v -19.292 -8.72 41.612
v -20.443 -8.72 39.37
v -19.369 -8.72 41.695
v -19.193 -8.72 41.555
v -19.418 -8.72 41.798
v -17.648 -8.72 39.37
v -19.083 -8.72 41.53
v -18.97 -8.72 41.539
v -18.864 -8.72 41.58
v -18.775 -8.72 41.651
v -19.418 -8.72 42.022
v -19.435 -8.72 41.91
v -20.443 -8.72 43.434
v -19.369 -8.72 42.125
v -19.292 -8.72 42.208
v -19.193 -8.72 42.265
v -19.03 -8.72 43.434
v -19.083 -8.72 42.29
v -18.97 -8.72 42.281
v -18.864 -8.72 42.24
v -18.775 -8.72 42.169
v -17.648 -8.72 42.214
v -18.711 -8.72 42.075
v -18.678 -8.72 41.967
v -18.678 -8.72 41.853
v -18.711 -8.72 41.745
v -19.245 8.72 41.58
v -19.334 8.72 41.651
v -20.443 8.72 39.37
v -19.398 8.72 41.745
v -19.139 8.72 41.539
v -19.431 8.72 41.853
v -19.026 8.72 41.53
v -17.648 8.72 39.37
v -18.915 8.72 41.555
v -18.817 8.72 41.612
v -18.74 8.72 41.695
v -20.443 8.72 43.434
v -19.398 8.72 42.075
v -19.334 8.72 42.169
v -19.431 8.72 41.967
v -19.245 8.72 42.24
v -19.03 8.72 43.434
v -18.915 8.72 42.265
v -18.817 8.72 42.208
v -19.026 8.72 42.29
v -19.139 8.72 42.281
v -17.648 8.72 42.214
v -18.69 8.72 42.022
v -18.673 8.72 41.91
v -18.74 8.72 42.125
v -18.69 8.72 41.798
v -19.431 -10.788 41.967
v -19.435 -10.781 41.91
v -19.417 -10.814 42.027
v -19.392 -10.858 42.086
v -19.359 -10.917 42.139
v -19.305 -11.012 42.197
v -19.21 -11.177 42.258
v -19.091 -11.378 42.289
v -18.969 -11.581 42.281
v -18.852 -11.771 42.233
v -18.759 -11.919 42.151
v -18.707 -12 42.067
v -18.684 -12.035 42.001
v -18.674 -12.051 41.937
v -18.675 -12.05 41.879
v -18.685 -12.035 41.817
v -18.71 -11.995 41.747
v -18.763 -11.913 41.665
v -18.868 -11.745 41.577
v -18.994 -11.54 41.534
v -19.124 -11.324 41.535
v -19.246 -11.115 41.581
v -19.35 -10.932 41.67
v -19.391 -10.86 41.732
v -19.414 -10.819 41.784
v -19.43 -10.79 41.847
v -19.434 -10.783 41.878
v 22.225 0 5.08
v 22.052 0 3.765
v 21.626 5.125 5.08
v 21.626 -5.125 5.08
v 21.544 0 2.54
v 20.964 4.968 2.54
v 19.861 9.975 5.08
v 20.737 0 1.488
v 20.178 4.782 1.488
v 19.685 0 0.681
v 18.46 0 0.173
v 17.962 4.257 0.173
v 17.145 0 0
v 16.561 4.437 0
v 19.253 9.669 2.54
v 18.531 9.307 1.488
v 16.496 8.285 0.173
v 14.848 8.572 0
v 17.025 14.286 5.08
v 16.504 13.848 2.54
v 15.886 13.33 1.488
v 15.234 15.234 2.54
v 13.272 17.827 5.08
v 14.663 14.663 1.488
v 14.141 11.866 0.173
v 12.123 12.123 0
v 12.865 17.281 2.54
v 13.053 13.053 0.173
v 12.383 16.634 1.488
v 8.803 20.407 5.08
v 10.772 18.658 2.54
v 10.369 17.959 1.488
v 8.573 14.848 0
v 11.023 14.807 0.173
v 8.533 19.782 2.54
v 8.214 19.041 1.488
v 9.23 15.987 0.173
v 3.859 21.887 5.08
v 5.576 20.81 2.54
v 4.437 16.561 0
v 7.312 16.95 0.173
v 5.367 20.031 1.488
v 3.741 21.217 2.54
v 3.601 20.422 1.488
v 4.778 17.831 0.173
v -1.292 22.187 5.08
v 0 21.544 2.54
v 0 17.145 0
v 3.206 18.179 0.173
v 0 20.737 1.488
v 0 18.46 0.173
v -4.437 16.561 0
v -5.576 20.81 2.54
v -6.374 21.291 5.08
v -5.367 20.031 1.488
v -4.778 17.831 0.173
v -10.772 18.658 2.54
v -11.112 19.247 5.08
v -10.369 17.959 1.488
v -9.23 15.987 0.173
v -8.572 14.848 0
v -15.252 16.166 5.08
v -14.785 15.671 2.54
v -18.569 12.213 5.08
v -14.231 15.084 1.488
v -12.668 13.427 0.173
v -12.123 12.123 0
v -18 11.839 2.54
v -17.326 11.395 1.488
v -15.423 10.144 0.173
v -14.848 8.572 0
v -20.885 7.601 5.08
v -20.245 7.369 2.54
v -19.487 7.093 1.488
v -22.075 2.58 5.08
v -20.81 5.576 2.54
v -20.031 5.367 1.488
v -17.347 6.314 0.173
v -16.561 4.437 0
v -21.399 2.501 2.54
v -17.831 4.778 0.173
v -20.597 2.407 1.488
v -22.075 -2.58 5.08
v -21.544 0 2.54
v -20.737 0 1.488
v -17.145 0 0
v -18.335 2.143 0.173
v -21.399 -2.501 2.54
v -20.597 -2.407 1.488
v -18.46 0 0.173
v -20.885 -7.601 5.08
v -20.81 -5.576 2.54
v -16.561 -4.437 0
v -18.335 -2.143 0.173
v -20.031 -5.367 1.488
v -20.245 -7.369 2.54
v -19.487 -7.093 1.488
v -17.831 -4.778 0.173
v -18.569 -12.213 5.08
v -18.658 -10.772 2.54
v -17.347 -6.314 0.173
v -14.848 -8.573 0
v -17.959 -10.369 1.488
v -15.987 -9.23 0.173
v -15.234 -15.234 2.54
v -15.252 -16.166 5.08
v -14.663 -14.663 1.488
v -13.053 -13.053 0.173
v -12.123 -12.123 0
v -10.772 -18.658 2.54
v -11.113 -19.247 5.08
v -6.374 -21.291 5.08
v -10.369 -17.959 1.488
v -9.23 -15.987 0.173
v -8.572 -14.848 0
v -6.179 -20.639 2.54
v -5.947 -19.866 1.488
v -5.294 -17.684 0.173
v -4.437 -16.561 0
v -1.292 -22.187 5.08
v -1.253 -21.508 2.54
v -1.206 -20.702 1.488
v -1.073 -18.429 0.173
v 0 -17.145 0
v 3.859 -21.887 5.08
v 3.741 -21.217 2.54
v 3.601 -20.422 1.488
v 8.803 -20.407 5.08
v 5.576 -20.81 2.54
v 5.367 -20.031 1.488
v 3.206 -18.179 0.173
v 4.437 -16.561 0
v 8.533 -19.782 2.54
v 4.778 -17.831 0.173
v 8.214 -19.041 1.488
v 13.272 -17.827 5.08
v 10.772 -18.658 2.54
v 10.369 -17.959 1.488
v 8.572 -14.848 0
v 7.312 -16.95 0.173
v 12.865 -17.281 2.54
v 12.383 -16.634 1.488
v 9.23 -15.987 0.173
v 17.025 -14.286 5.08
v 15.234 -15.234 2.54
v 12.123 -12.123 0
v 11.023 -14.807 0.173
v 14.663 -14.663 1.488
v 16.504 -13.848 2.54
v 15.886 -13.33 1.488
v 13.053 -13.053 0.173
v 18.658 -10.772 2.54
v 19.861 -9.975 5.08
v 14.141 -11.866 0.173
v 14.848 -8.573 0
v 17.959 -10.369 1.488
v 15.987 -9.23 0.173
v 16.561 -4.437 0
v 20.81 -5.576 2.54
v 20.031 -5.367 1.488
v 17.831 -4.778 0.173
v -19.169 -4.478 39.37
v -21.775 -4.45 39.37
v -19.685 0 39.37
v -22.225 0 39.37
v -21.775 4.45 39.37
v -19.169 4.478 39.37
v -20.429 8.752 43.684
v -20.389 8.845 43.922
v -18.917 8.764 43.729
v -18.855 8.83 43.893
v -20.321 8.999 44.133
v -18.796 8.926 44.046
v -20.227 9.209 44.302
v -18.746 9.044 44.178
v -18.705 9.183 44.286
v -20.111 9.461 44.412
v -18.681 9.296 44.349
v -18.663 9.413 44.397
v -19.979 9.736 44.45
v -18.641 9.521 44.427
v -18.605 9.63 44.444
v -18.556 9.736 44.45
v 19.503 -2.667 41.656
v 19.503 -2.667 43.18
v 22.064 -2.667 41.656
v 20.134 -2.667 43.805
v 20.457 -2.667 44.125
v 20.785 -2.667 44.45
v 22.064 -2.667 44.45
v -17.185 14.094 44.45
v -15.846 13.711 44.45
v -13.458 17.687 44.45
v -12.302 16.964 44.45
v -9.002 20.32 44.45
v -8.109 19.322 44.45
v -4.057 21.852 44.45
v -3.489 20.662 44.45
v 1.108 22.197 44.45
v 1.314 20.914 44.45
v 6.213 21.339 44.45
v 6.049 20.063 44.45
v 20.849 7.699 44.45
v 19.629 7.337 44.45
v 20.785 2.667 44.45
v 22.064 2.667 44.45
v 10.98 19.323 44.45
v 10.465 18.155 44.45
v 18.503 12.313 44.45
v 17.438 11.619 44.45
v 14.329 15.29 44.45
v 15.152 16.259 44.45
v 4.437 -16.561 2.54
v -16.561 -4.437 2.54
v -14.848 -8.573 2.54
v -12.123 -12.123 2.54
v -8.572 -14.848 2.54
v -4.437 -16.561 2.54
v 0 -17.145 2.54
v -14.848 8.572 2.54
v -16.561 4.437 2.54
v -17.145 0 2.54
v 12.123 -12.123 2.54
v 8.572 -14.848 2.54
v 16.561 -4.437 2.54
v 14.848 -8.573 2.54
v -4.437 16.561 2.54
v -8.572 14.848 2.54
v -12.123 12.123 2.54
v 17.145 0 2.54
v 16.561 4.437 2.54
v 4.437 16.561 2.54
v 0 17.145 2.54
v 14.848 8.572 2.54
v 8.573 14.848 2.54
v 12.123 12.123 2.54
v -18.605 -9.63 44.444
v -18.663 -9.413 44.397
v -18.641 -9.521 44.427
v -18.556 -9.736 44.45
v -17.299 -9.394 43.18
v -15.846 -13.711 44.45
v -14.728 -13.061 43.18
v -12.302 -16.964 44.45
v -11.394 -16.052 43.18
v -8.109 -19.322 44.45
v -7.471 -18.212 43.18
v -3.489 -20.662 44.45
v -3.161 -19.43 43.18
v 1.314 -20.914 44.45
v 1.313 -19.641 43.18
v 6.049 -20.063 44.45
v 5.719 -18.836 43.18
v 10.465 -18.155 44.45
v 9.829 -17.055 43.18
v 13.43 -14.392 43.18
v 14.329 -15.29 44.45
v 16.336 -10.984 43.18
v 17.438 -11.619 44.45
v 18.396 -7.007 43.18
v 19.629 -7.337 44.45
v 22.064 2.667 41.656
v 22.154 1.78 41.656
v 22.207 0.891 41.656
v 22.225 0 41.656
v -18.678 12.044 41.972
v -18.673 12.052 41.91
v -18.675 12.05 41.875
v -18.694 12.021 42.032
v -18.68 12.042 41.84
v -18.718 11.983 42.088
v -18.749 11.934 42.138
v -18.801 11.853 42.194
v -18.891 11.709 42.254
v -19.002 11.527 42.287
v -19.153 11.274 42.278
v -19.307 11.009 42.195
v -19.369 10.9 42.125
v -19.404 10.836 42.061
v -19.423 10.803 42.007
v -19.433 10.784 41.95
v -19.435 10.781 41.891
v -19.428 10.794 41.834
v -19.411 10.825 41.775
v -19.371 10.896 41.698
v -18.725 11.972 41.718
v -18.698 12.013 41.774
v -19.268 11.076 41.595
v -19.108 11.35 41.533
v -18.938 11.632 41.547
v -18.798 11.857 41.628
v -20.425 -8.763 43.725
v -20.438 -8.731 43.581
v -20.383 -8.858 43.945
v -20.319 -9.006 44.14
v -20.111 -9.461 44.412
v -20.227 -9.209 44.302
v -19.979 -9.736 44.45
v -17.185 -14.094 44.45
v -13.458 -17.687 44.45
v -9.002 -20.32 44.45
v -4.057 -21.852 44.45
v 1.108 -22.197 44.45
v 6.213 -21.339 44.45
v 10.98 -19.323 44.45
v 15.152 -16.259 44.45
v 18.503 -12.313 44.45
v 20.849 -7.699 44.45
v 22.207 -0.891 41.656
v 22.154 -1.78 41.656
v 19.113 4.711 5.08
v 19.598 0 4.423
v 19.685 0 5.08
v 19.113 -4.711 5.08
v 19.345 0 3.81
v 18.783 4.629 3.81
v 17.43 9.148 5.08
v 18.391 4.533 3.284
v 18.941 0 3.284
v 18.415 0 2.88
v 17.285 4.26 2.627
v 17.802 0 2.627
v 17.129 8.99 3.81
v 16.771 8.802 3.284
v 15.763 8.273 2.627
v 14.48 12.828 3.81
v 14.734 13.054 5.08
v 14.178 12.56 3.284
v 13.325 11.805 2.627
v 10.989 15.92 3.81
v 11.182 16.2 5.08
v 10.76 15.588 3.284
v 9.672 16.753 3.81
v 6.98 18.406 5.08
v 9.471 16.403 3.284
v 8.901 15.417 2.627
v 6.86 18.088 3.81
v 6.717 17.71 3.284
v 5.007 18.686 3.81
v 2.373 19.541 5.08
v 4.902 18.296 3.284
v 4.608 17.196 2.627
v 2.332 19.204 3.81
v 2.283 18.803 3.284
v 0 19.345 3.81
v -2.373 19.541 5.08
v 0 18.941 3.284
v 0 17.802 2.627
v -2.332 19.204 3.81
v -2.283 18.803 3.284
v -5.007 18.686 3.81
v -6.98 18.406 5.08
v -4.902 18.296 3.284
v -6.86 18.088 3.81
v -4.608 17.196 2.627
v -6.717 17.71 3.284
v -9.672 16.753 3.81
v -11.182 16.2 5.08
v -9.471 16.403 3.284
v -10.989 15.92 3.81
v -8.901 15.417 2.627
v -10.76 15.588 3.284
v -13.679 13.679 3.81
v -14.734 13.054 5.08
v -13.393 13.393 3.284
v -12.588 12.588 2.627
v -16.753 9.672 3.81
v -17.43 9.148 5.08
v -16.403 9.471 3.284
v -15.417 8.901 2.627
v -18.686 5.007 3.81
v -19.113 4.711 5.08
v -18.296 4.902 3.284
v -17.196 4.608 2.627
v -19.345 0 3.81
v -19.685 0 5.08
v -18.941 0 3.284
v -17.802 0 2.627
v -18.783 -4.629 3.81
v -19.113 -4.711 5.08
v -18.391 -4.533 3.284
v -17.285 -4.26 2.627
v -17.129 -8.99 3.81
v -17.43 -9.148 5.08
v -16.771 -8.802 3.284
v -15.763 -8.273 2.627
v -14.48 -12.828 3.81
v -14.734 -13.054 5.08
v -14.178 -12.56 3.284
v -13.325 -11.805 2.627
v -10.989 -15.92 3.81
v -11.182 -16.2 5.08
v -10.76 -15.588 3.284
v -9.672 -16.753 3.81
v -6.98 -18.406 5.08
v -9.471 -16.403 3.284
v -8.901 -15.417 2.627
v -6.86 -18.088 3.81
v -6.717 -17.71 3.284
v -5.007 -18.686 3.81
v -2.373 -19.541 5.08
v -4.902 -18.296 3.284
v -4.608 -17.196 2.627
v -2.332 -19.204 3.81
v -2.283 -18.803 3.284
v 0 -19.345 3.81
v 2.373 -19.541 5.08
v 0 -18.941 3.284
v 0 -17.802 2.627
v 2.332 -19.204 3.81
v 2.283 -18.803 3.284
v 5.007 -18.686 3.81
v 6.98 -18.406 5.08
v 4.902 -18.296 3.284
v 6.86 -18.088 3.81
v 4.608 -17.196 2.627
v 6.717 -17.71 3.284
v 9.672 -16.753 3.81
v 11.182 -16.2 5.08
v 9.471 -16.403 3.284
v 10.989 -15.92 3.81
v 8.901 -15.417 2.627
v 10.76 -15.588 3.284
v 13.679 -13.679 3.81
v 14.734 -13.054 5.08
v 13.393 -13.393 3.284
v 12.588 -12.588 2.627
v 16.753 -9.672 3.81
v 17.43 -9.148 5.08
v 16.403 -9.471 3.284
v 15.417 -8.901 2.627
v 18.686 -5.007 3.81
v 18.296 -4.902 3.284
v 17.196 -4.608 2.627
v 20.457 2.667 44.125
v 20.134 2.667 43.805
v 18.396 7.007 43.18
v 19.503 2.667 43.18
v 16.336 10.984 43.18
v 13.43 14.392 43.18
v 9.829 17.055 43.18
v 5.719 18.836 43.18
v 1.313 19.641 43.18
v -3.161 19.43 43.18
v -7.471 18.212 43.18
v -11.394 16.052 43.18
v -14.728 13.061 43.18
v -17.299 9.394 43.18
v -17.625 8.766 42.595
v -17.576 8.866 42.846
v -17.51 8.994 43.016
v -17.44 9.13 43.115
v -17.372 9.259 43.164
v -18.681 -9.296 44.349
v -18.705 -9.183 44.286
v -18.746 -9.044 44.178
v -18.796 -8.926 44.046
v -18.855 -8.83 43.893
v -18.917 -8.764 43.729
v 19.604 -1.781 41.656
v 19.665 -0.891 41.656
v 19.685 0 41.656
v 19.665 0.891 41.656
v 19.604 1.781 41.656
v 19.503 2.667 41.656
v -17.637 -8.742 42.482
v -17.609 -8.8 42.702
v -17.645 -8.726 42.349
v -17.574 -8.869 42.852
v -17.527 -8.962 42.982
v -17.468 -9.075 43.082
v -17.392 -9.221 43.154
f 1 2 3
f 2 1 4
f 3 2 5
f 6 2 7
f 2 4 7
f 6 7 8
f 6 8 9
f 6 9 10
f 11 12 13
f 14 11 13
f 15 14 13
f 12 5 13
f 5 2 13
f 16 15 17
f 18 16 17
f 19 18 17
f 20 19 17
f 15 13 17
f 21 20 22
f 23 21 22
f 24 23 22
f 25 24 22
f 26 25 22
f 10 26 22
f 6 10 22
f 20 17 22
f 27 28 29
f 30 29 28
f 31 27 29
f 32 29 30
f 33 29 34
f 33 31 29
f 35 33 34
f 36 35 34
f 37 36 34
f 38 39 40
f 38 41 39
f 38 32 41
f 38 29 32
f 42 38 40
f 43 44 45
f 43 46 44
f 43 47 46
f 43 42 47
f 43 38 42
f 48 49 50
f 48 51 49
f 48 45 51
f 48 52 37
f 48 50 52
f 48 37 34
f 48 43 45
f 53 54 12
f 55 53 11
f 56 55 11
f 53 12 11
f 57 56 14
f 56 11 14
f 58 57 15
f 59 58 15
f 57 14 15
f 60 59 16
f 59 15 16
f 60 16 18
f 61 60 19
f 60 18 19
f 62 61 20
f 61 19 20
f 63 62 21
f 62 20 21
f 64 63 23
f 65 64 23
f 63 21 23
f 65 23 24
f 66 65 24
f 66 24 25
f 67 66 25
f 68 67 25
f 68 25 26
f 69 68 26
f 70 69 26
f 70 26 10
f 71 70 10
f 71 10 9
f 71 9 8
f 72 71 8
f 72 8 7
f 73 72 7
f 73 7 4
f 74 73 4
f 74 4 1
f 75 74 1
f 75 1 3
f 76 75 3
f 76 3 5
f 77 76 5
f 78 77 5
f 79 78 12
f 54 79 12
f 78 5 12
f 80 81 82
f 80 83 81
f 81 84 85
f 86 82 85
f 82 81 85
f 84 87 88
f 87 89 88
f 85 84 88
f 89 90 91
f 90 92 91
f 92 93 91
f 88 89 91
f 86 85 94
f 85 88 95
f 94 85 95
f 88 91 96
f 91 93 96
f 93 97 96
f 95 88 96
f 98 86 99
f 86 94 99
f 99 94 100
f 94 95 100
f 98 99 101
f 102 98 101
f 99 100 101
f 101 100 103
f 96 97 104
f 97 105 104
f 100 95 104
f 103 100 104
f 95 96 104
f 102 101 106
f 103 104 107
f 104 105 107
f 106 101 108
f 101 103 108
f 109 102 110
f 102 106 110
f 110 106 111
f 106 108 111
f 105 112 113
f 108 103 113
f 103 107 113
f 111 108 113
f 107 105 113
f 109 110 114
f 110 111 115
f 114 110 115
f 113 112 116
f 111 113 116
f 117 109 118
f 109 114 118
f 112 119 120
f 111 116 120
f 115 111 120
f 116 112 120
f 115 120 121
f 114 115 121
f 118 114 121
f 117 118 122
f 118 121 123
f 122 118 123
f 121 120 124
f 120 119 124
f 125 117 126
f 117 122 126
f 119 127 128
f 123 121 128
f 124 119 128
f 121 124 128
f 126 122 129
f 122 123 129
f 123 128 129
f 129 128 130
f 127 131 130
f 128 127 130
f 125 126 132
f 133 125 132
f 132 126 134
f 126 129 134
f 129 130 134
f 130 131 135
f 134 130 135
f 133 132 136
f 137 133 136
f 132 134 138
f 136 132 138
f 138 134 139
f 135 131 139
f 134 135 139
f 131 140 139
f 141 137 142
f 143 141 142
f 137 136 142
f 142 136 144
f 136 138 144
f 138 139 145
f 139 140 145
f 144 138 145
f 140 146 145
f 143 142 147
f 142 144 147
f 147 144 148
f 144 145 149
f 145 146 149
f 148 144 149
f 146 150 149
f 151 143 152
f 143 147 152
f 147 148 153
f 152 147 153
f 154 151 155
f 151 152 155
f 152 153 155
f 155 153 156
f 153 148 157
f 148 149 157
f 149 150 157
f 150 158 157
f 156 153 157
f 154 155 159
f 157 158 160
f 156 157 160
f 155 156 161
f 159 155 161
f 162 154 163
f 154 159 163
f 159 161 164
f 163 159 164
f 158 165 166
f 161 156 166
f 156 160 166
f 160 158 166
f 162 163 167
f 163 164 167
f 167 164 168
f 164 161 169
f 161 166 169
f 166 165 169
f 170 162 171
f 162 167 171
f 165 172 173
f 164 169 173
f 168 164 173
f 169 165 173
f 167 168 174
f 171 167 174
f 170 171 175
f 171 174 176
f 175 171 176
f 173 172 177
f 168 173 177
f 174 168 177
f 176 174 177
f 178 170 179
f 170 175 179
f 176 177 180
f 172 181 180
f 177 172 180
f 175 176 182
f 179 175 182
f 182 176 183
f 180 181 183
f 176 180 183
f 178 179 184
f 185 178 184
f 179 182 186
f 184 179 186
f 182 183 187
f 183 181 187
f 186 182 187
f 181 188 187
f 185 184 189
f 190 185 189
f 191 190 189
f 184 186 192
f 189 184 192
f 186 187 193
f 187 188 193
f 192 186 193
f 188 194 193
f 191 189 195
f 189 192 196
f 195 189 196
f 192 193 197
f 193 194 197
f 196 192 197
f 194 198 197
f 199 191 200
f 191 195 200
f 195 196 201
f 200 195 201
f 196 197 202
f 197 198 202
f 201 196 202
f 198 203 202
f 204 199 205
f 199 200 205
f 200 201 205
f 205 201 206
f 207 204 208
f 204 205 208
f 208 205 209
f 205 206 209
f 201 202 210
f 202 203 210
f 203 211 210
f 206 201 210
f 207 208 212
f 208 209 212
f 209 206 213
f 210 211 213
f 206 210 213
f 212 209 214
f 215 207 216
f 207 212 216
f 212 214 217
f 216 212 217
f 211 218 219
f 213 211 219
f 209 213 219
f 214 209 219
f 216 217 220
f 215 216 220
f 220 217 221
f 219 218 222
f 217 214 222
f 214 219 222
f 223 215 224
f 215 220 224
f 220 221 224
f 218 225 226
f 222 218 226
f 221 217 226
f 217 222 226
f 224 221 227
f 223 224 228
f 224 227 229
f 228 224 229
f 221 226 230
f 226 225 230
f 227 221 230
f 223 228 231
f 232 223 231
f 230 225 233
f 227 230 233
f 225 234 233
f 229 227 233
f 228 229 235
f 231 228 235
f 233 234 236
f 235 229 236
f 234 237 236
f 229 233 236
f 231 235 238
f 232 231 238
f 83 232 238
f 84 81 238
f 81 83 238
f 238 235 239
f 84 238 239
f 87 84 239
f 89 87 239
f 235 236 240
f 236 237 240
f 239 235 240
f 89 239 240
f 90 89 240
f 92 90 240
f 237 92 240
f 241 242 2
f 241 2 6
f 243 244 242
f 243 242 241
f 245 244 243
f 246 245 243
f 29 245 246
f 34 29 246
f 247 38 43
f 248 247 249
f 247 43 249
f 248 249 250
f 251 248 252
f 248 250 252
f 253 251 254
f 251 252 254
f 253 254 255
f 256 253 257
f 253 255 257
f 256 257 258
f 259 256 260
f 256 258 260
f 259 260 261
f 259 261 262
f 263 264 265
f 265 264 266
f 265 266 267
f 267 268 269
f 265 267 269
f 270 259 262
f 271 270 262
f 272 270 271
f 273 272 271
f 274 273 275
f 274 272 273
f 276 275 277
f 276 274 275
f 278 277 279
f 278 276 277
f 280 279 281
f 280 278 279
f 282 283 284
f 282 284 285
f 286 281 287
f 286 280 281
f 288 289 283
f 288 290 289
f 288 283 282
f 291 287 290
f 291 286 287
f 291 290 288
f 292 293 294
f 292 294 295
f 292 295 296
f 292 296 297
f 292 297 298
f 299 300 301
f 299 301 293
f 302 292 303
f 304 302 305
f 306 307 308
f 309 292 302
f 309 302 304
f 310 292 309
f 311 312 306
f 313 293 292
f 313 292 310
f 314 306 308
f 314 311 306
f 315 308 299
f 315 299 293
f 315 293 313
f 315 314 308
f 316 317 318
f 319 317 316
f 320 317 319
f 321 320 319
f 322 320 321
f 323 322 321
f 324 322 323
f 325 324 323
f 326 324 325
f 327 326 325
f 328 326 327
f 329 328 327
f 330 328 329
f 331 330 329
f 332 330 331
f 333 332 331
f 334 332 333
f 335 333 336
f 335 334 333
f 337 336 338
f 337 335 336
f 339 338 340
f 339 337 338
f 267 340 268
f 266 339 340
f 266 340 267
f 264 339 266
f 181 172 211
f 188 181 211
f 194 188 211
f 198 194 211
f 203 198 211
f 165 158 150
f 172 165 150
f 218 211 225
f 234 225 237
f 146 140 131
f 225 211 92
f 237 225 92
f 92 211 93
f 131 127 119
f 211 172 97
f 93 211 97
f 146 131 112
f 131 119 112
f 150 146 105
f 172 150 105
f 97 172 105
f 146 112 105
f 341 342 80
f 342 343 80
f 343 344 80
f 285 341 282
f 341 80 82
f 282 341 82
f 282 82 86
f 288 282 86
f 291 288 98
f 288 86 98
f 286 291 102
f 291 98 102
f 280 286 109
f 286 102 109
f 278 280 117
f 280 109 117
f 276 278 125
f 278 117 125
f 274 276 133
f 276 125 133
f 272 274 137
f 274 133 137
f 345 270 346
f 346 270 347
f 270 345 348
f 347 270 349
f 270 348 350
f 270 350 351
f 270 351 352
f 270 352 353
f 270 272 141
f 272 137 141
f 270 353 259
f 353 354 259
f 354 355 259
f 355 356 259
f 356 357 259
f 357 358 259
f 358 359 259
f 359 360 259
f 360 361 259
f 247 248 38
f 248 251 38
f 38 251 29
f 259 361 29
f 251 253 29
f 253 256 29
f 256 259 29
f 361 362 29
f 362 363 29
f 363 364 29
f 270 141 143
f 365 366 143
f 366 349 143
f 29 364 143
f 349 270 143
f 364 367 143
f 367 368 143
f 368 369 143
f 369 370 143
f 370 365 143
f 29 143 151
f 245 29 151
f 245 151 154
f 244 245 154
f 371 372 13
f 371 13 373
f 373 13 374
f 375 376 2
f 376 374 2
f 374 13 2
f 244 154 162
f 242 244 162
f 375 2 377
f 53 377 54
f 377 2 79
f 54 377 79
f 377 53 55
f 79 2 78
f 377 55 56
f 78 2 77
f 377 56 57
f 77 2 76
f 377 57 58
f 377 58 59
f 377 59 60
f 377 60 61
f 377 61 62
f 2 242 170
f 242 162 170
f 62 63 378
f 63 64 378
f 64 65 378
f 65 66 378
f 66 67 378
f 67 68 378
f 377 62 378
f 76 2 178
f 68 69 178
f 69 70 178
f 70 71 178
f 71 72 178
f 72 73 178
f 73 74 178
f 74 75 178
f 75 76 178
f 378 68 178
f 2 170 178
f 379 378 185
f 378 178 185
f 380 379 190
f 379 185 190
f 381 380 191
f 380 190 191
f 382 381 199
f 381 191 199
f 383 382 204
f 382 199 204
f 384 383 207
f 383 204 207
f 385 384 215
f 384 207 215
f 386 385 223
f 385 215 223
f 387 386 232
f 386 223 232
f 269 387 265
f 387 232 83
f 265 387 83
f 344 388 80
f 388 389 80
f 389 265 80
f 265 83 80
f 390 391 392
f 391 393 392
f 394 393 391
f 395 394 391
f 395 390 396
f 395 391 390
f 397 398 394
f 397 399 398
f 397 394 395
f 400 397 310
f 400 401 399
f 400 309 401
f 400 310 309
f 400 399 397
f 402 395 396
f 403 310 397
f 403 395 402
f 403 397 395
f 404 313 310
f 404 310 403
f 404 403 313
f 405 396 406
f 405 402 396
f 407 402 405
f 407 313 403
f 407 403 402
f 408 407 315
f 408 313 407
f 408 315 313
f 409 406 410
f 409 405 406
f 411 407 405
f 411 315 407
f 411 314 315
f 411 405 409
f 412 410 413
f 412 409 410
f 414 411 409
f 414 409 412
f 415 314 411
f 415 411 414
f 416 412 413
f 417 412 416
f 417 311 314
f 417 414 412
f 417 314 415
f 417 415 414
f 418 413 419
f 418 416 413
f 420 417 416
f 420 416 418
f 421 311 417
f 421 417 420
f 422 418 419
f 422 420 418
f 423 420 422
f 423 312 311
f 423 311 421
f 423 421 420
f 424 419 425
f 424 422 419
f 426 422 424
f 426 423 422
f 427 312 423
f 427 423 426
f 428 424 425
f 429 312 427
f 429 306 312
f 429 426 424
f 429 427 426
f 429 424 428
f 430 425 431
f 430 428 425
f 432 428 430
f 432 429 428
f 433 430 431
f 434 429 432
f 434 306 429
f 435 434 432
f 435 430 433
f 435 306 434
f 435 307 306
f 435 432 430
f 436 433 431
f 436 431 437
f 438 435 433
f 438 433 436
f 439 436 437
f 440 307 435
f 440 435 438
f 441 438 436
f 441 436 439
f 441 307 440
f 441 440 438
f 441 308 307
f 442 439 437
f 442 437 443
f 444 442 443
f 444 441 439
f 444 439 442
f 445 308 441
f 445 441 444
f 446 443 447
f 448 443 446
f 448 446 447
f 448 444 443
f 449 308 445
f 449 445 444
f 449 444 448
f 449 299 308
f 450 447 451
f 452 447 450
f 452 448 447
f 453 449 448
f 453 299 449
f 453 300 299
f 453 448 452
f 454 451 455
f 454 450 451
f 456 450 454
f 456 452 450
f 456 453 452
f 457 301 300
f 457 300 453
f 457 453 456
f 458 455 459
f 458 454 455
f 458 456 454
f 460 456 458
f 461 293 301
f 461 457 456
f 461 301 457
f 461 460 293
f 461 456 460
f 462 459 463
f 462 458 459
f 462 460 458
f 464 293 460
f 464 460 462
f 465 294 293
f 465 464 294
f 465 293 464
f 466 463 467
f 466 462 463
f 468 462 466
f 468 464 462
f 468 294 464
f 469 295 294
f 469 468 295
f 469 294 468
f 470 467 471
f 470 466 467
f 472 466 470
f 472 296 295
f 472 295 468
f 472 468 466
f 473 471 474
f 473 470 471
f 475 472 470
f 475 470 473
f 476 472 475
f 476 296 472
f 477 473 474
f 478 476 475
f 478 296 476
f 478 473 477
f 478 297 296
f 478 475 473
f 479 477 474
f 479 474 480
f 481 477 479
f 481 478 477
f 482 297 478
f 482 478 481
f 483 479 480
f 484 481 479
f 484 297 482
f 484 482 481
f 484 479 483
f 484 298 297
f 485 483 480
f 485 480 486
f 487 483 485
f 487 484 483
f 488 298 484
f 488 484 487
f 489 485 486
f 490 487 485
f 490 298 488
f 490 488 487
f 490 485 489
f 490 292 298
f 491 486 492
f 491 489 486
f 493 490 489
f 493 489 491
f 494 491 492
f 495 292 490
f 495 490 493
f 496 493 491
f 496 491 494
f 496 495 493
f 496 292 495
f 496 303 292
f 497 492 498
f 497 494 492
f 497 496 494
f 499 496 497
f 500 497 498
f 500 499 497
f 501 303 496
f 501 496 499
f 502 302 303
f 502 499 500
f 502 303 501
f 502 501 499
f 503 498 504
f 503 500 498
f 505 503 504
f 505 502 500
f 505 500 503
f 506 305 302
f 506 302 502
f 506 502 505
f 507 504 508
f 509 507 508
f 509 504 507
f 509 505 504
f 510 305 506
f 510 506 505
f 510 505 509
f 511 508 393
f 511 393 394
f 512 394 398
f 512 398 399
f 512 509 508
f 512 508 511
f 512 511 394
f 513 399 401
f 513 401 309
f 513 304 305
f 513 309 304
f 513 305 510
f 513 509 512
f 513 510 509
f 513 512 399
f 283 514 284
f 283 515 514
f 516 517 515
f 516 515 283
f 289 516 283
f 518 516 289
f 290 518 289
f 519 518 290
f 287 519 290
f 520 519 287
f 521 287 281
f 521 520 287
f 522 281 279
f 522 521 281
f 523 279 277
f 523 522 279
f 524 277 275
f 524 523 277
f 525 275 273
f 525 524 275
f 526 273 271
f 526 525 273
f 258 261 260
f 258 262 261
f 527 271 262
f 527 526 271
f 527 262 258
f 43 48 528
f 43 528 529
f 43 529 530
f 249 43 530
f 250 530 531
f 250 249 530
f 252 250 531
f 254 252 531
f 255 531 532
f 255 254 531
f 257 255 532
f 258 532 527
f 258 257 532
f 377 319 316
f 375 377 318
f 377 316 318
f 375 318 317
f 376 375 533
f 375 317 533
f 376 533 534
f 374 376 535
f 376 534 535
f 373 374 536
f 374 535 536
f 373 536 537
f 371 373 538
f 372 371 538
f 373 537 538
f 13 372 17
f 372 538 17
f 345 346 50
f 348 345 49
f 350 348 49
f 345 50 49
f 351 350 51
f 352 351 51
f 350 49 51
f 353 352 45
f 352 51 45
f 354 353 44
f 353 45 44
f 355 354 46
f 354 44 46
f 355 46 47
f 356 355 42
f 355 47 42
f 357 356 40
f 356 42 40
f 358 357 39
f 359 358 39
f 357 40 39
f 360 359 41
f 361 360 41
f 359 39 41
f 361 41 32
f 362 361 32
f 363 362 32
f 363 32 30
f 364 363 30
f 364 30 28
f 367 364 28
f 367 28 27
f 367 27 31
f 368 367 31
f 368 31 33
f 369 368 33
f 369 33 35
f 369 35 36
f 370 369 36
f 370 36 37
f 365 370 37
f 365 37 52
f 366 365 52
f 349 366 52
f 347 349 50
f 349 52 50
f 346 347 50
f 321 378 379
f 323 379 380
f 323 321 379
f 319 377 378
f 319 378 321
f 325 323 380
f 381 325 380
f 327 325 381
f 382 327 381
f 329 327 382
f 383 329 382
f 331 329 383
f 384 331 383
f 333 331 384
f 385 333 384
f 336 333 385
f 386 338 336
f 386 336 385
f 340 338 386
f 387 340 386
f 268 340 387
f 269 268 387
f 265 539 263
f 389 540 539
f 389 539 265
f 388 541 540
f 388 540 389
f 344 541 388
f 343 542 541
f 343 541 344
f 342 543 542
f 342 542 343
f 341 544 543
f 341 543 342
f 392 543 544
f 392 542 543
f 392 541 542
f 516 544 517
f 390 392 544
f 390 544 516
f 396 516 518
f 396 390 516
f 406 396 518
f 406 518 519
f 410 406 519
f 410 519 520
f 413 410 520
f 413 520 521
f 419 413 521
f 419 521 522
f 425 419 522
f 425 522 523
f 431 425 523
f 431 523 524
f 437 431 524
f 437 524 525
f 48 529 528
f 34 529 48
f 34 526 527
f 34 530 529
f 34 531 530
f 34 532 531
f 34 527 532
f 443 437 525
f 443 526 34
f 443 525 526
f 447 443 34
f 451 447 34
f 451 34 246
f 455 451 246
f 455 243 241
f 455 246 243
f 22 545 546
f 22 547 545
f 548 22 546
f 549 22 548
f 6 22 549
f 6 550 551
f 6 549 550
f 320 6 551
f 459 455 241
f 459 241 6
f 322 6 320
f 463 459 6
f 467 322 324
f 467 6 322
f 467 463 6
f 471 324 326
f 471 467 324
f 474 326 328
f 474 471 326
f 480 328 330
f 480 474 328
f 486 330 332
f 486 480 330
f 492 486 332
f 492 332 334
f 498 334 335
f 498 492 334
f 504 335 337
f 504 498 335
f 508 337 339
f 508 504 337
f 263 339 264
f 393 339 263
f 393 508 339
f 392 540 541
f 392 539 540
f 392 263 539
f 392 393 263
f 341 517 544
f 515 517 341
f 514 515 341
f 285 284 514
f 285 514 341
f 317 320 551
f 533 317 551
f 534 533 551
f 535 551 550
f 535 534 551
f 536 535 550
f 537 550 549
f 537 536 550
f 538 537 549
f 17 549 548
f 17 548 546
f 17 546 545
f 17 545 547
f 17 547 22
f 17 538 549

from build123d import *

# Parameters (mm, degrees)
F0_R      = 22.225
F1_DEPTH  = 44.45
F2_R      = 5.08
F3_T      = -2.54
F4_W      = 10.4627240348
F4_H      = 5.334
F5_DEPTH  = 2.794
F6_SIZE   = 1.27
F7_W      = 12.1457316697
F7_H      = 17.4408461899
F8_DEPTH  = 5.08
F9_R      = 0.381
F10_DEPTH = 6.35
F11_R     = 0.381
F12_DEPTH = 6.35
F13_R     = 1.016


with BuildPart() as f1:
    # F0 (on Top) → F1 (new body)
    with BuildSketch(Plane.XY):
        Circle(F0_R)
    extrude(amount=F1_DEPTH)

    # F2
    f2_edges = [f1.edges().sort_by_distance(p)[0] for p in [
        (-22.225, 0, 0),
    ]]
    fillet(f2_edges, radius=F2_R)

    # F3
    f3_openings = [f1.faces().sort_by_distance(p)[0] for p in [
        (0, 0, 44.45),
    ]]
    offset(amount=F3_T, openings=f3_openings)

    # F4 (on face) → F5 (cut)
    with BuildSketch(Plane.XY.offset(44.45)):
        with Locations((19.685, 0)):
            Rectangle(F4_W, F4_H)
    extrude(amount=-F5_DEPTH, mode=Mode.SUBTRACT)

    # F6
    f6_edges = [f1.edges().sort_by_distance(p)[0] for p in [
        (-19.685, 0, 44.45),
    ]]
    chamfer(f6_edges, length=F6_SIZE)

    # F7 (on face) → F8 (cut)
    with BuildSketch(Plane.XY.offset(44.45)):
        with Locations((-22.225, 0)):
            Rectangle(F7_W, F7_H)
    extrude(amount=-F8_DEPTH, mode=Mode.SUBTRACT)

    # F9 (on face) → F10 (cut)
    with BuildSketch(Plane(origin=(0, -8.7204230949, 0), x_dir=(-1, 0, 0), z_dir=(0, 1, 0))):
        with Locations((19.0542973118, 41.91)):
            Circle(F9_R)
    extrude(amount=-F10_DEPTH, mode=Mode.SUBTRACT)

    # F11 (on face) → F12 (cut)
    with BuildSketch(Plane.XZ.offset(-8.7204230949)):
        with Locations((-19.0542973118, 41.91)):
            Circle(F11_R)
    extrude(amount=-F12_DEPTH, mode=Mode.SUBTRACT)

    # F13
    f13_edges = [f1.edges().sort_by_distance(p)[0] for p in [
        (-19.748509, 8.720423, 44.45),
        (-19.748509, -8.720423, 44.45),
        (-18.352286, -8.720423, 43.813764),
        (-18.352286, 8.720423, 43.813764),
    ]]
    fillet(f13_edges, radius=F13_R)


solid = f1.part
